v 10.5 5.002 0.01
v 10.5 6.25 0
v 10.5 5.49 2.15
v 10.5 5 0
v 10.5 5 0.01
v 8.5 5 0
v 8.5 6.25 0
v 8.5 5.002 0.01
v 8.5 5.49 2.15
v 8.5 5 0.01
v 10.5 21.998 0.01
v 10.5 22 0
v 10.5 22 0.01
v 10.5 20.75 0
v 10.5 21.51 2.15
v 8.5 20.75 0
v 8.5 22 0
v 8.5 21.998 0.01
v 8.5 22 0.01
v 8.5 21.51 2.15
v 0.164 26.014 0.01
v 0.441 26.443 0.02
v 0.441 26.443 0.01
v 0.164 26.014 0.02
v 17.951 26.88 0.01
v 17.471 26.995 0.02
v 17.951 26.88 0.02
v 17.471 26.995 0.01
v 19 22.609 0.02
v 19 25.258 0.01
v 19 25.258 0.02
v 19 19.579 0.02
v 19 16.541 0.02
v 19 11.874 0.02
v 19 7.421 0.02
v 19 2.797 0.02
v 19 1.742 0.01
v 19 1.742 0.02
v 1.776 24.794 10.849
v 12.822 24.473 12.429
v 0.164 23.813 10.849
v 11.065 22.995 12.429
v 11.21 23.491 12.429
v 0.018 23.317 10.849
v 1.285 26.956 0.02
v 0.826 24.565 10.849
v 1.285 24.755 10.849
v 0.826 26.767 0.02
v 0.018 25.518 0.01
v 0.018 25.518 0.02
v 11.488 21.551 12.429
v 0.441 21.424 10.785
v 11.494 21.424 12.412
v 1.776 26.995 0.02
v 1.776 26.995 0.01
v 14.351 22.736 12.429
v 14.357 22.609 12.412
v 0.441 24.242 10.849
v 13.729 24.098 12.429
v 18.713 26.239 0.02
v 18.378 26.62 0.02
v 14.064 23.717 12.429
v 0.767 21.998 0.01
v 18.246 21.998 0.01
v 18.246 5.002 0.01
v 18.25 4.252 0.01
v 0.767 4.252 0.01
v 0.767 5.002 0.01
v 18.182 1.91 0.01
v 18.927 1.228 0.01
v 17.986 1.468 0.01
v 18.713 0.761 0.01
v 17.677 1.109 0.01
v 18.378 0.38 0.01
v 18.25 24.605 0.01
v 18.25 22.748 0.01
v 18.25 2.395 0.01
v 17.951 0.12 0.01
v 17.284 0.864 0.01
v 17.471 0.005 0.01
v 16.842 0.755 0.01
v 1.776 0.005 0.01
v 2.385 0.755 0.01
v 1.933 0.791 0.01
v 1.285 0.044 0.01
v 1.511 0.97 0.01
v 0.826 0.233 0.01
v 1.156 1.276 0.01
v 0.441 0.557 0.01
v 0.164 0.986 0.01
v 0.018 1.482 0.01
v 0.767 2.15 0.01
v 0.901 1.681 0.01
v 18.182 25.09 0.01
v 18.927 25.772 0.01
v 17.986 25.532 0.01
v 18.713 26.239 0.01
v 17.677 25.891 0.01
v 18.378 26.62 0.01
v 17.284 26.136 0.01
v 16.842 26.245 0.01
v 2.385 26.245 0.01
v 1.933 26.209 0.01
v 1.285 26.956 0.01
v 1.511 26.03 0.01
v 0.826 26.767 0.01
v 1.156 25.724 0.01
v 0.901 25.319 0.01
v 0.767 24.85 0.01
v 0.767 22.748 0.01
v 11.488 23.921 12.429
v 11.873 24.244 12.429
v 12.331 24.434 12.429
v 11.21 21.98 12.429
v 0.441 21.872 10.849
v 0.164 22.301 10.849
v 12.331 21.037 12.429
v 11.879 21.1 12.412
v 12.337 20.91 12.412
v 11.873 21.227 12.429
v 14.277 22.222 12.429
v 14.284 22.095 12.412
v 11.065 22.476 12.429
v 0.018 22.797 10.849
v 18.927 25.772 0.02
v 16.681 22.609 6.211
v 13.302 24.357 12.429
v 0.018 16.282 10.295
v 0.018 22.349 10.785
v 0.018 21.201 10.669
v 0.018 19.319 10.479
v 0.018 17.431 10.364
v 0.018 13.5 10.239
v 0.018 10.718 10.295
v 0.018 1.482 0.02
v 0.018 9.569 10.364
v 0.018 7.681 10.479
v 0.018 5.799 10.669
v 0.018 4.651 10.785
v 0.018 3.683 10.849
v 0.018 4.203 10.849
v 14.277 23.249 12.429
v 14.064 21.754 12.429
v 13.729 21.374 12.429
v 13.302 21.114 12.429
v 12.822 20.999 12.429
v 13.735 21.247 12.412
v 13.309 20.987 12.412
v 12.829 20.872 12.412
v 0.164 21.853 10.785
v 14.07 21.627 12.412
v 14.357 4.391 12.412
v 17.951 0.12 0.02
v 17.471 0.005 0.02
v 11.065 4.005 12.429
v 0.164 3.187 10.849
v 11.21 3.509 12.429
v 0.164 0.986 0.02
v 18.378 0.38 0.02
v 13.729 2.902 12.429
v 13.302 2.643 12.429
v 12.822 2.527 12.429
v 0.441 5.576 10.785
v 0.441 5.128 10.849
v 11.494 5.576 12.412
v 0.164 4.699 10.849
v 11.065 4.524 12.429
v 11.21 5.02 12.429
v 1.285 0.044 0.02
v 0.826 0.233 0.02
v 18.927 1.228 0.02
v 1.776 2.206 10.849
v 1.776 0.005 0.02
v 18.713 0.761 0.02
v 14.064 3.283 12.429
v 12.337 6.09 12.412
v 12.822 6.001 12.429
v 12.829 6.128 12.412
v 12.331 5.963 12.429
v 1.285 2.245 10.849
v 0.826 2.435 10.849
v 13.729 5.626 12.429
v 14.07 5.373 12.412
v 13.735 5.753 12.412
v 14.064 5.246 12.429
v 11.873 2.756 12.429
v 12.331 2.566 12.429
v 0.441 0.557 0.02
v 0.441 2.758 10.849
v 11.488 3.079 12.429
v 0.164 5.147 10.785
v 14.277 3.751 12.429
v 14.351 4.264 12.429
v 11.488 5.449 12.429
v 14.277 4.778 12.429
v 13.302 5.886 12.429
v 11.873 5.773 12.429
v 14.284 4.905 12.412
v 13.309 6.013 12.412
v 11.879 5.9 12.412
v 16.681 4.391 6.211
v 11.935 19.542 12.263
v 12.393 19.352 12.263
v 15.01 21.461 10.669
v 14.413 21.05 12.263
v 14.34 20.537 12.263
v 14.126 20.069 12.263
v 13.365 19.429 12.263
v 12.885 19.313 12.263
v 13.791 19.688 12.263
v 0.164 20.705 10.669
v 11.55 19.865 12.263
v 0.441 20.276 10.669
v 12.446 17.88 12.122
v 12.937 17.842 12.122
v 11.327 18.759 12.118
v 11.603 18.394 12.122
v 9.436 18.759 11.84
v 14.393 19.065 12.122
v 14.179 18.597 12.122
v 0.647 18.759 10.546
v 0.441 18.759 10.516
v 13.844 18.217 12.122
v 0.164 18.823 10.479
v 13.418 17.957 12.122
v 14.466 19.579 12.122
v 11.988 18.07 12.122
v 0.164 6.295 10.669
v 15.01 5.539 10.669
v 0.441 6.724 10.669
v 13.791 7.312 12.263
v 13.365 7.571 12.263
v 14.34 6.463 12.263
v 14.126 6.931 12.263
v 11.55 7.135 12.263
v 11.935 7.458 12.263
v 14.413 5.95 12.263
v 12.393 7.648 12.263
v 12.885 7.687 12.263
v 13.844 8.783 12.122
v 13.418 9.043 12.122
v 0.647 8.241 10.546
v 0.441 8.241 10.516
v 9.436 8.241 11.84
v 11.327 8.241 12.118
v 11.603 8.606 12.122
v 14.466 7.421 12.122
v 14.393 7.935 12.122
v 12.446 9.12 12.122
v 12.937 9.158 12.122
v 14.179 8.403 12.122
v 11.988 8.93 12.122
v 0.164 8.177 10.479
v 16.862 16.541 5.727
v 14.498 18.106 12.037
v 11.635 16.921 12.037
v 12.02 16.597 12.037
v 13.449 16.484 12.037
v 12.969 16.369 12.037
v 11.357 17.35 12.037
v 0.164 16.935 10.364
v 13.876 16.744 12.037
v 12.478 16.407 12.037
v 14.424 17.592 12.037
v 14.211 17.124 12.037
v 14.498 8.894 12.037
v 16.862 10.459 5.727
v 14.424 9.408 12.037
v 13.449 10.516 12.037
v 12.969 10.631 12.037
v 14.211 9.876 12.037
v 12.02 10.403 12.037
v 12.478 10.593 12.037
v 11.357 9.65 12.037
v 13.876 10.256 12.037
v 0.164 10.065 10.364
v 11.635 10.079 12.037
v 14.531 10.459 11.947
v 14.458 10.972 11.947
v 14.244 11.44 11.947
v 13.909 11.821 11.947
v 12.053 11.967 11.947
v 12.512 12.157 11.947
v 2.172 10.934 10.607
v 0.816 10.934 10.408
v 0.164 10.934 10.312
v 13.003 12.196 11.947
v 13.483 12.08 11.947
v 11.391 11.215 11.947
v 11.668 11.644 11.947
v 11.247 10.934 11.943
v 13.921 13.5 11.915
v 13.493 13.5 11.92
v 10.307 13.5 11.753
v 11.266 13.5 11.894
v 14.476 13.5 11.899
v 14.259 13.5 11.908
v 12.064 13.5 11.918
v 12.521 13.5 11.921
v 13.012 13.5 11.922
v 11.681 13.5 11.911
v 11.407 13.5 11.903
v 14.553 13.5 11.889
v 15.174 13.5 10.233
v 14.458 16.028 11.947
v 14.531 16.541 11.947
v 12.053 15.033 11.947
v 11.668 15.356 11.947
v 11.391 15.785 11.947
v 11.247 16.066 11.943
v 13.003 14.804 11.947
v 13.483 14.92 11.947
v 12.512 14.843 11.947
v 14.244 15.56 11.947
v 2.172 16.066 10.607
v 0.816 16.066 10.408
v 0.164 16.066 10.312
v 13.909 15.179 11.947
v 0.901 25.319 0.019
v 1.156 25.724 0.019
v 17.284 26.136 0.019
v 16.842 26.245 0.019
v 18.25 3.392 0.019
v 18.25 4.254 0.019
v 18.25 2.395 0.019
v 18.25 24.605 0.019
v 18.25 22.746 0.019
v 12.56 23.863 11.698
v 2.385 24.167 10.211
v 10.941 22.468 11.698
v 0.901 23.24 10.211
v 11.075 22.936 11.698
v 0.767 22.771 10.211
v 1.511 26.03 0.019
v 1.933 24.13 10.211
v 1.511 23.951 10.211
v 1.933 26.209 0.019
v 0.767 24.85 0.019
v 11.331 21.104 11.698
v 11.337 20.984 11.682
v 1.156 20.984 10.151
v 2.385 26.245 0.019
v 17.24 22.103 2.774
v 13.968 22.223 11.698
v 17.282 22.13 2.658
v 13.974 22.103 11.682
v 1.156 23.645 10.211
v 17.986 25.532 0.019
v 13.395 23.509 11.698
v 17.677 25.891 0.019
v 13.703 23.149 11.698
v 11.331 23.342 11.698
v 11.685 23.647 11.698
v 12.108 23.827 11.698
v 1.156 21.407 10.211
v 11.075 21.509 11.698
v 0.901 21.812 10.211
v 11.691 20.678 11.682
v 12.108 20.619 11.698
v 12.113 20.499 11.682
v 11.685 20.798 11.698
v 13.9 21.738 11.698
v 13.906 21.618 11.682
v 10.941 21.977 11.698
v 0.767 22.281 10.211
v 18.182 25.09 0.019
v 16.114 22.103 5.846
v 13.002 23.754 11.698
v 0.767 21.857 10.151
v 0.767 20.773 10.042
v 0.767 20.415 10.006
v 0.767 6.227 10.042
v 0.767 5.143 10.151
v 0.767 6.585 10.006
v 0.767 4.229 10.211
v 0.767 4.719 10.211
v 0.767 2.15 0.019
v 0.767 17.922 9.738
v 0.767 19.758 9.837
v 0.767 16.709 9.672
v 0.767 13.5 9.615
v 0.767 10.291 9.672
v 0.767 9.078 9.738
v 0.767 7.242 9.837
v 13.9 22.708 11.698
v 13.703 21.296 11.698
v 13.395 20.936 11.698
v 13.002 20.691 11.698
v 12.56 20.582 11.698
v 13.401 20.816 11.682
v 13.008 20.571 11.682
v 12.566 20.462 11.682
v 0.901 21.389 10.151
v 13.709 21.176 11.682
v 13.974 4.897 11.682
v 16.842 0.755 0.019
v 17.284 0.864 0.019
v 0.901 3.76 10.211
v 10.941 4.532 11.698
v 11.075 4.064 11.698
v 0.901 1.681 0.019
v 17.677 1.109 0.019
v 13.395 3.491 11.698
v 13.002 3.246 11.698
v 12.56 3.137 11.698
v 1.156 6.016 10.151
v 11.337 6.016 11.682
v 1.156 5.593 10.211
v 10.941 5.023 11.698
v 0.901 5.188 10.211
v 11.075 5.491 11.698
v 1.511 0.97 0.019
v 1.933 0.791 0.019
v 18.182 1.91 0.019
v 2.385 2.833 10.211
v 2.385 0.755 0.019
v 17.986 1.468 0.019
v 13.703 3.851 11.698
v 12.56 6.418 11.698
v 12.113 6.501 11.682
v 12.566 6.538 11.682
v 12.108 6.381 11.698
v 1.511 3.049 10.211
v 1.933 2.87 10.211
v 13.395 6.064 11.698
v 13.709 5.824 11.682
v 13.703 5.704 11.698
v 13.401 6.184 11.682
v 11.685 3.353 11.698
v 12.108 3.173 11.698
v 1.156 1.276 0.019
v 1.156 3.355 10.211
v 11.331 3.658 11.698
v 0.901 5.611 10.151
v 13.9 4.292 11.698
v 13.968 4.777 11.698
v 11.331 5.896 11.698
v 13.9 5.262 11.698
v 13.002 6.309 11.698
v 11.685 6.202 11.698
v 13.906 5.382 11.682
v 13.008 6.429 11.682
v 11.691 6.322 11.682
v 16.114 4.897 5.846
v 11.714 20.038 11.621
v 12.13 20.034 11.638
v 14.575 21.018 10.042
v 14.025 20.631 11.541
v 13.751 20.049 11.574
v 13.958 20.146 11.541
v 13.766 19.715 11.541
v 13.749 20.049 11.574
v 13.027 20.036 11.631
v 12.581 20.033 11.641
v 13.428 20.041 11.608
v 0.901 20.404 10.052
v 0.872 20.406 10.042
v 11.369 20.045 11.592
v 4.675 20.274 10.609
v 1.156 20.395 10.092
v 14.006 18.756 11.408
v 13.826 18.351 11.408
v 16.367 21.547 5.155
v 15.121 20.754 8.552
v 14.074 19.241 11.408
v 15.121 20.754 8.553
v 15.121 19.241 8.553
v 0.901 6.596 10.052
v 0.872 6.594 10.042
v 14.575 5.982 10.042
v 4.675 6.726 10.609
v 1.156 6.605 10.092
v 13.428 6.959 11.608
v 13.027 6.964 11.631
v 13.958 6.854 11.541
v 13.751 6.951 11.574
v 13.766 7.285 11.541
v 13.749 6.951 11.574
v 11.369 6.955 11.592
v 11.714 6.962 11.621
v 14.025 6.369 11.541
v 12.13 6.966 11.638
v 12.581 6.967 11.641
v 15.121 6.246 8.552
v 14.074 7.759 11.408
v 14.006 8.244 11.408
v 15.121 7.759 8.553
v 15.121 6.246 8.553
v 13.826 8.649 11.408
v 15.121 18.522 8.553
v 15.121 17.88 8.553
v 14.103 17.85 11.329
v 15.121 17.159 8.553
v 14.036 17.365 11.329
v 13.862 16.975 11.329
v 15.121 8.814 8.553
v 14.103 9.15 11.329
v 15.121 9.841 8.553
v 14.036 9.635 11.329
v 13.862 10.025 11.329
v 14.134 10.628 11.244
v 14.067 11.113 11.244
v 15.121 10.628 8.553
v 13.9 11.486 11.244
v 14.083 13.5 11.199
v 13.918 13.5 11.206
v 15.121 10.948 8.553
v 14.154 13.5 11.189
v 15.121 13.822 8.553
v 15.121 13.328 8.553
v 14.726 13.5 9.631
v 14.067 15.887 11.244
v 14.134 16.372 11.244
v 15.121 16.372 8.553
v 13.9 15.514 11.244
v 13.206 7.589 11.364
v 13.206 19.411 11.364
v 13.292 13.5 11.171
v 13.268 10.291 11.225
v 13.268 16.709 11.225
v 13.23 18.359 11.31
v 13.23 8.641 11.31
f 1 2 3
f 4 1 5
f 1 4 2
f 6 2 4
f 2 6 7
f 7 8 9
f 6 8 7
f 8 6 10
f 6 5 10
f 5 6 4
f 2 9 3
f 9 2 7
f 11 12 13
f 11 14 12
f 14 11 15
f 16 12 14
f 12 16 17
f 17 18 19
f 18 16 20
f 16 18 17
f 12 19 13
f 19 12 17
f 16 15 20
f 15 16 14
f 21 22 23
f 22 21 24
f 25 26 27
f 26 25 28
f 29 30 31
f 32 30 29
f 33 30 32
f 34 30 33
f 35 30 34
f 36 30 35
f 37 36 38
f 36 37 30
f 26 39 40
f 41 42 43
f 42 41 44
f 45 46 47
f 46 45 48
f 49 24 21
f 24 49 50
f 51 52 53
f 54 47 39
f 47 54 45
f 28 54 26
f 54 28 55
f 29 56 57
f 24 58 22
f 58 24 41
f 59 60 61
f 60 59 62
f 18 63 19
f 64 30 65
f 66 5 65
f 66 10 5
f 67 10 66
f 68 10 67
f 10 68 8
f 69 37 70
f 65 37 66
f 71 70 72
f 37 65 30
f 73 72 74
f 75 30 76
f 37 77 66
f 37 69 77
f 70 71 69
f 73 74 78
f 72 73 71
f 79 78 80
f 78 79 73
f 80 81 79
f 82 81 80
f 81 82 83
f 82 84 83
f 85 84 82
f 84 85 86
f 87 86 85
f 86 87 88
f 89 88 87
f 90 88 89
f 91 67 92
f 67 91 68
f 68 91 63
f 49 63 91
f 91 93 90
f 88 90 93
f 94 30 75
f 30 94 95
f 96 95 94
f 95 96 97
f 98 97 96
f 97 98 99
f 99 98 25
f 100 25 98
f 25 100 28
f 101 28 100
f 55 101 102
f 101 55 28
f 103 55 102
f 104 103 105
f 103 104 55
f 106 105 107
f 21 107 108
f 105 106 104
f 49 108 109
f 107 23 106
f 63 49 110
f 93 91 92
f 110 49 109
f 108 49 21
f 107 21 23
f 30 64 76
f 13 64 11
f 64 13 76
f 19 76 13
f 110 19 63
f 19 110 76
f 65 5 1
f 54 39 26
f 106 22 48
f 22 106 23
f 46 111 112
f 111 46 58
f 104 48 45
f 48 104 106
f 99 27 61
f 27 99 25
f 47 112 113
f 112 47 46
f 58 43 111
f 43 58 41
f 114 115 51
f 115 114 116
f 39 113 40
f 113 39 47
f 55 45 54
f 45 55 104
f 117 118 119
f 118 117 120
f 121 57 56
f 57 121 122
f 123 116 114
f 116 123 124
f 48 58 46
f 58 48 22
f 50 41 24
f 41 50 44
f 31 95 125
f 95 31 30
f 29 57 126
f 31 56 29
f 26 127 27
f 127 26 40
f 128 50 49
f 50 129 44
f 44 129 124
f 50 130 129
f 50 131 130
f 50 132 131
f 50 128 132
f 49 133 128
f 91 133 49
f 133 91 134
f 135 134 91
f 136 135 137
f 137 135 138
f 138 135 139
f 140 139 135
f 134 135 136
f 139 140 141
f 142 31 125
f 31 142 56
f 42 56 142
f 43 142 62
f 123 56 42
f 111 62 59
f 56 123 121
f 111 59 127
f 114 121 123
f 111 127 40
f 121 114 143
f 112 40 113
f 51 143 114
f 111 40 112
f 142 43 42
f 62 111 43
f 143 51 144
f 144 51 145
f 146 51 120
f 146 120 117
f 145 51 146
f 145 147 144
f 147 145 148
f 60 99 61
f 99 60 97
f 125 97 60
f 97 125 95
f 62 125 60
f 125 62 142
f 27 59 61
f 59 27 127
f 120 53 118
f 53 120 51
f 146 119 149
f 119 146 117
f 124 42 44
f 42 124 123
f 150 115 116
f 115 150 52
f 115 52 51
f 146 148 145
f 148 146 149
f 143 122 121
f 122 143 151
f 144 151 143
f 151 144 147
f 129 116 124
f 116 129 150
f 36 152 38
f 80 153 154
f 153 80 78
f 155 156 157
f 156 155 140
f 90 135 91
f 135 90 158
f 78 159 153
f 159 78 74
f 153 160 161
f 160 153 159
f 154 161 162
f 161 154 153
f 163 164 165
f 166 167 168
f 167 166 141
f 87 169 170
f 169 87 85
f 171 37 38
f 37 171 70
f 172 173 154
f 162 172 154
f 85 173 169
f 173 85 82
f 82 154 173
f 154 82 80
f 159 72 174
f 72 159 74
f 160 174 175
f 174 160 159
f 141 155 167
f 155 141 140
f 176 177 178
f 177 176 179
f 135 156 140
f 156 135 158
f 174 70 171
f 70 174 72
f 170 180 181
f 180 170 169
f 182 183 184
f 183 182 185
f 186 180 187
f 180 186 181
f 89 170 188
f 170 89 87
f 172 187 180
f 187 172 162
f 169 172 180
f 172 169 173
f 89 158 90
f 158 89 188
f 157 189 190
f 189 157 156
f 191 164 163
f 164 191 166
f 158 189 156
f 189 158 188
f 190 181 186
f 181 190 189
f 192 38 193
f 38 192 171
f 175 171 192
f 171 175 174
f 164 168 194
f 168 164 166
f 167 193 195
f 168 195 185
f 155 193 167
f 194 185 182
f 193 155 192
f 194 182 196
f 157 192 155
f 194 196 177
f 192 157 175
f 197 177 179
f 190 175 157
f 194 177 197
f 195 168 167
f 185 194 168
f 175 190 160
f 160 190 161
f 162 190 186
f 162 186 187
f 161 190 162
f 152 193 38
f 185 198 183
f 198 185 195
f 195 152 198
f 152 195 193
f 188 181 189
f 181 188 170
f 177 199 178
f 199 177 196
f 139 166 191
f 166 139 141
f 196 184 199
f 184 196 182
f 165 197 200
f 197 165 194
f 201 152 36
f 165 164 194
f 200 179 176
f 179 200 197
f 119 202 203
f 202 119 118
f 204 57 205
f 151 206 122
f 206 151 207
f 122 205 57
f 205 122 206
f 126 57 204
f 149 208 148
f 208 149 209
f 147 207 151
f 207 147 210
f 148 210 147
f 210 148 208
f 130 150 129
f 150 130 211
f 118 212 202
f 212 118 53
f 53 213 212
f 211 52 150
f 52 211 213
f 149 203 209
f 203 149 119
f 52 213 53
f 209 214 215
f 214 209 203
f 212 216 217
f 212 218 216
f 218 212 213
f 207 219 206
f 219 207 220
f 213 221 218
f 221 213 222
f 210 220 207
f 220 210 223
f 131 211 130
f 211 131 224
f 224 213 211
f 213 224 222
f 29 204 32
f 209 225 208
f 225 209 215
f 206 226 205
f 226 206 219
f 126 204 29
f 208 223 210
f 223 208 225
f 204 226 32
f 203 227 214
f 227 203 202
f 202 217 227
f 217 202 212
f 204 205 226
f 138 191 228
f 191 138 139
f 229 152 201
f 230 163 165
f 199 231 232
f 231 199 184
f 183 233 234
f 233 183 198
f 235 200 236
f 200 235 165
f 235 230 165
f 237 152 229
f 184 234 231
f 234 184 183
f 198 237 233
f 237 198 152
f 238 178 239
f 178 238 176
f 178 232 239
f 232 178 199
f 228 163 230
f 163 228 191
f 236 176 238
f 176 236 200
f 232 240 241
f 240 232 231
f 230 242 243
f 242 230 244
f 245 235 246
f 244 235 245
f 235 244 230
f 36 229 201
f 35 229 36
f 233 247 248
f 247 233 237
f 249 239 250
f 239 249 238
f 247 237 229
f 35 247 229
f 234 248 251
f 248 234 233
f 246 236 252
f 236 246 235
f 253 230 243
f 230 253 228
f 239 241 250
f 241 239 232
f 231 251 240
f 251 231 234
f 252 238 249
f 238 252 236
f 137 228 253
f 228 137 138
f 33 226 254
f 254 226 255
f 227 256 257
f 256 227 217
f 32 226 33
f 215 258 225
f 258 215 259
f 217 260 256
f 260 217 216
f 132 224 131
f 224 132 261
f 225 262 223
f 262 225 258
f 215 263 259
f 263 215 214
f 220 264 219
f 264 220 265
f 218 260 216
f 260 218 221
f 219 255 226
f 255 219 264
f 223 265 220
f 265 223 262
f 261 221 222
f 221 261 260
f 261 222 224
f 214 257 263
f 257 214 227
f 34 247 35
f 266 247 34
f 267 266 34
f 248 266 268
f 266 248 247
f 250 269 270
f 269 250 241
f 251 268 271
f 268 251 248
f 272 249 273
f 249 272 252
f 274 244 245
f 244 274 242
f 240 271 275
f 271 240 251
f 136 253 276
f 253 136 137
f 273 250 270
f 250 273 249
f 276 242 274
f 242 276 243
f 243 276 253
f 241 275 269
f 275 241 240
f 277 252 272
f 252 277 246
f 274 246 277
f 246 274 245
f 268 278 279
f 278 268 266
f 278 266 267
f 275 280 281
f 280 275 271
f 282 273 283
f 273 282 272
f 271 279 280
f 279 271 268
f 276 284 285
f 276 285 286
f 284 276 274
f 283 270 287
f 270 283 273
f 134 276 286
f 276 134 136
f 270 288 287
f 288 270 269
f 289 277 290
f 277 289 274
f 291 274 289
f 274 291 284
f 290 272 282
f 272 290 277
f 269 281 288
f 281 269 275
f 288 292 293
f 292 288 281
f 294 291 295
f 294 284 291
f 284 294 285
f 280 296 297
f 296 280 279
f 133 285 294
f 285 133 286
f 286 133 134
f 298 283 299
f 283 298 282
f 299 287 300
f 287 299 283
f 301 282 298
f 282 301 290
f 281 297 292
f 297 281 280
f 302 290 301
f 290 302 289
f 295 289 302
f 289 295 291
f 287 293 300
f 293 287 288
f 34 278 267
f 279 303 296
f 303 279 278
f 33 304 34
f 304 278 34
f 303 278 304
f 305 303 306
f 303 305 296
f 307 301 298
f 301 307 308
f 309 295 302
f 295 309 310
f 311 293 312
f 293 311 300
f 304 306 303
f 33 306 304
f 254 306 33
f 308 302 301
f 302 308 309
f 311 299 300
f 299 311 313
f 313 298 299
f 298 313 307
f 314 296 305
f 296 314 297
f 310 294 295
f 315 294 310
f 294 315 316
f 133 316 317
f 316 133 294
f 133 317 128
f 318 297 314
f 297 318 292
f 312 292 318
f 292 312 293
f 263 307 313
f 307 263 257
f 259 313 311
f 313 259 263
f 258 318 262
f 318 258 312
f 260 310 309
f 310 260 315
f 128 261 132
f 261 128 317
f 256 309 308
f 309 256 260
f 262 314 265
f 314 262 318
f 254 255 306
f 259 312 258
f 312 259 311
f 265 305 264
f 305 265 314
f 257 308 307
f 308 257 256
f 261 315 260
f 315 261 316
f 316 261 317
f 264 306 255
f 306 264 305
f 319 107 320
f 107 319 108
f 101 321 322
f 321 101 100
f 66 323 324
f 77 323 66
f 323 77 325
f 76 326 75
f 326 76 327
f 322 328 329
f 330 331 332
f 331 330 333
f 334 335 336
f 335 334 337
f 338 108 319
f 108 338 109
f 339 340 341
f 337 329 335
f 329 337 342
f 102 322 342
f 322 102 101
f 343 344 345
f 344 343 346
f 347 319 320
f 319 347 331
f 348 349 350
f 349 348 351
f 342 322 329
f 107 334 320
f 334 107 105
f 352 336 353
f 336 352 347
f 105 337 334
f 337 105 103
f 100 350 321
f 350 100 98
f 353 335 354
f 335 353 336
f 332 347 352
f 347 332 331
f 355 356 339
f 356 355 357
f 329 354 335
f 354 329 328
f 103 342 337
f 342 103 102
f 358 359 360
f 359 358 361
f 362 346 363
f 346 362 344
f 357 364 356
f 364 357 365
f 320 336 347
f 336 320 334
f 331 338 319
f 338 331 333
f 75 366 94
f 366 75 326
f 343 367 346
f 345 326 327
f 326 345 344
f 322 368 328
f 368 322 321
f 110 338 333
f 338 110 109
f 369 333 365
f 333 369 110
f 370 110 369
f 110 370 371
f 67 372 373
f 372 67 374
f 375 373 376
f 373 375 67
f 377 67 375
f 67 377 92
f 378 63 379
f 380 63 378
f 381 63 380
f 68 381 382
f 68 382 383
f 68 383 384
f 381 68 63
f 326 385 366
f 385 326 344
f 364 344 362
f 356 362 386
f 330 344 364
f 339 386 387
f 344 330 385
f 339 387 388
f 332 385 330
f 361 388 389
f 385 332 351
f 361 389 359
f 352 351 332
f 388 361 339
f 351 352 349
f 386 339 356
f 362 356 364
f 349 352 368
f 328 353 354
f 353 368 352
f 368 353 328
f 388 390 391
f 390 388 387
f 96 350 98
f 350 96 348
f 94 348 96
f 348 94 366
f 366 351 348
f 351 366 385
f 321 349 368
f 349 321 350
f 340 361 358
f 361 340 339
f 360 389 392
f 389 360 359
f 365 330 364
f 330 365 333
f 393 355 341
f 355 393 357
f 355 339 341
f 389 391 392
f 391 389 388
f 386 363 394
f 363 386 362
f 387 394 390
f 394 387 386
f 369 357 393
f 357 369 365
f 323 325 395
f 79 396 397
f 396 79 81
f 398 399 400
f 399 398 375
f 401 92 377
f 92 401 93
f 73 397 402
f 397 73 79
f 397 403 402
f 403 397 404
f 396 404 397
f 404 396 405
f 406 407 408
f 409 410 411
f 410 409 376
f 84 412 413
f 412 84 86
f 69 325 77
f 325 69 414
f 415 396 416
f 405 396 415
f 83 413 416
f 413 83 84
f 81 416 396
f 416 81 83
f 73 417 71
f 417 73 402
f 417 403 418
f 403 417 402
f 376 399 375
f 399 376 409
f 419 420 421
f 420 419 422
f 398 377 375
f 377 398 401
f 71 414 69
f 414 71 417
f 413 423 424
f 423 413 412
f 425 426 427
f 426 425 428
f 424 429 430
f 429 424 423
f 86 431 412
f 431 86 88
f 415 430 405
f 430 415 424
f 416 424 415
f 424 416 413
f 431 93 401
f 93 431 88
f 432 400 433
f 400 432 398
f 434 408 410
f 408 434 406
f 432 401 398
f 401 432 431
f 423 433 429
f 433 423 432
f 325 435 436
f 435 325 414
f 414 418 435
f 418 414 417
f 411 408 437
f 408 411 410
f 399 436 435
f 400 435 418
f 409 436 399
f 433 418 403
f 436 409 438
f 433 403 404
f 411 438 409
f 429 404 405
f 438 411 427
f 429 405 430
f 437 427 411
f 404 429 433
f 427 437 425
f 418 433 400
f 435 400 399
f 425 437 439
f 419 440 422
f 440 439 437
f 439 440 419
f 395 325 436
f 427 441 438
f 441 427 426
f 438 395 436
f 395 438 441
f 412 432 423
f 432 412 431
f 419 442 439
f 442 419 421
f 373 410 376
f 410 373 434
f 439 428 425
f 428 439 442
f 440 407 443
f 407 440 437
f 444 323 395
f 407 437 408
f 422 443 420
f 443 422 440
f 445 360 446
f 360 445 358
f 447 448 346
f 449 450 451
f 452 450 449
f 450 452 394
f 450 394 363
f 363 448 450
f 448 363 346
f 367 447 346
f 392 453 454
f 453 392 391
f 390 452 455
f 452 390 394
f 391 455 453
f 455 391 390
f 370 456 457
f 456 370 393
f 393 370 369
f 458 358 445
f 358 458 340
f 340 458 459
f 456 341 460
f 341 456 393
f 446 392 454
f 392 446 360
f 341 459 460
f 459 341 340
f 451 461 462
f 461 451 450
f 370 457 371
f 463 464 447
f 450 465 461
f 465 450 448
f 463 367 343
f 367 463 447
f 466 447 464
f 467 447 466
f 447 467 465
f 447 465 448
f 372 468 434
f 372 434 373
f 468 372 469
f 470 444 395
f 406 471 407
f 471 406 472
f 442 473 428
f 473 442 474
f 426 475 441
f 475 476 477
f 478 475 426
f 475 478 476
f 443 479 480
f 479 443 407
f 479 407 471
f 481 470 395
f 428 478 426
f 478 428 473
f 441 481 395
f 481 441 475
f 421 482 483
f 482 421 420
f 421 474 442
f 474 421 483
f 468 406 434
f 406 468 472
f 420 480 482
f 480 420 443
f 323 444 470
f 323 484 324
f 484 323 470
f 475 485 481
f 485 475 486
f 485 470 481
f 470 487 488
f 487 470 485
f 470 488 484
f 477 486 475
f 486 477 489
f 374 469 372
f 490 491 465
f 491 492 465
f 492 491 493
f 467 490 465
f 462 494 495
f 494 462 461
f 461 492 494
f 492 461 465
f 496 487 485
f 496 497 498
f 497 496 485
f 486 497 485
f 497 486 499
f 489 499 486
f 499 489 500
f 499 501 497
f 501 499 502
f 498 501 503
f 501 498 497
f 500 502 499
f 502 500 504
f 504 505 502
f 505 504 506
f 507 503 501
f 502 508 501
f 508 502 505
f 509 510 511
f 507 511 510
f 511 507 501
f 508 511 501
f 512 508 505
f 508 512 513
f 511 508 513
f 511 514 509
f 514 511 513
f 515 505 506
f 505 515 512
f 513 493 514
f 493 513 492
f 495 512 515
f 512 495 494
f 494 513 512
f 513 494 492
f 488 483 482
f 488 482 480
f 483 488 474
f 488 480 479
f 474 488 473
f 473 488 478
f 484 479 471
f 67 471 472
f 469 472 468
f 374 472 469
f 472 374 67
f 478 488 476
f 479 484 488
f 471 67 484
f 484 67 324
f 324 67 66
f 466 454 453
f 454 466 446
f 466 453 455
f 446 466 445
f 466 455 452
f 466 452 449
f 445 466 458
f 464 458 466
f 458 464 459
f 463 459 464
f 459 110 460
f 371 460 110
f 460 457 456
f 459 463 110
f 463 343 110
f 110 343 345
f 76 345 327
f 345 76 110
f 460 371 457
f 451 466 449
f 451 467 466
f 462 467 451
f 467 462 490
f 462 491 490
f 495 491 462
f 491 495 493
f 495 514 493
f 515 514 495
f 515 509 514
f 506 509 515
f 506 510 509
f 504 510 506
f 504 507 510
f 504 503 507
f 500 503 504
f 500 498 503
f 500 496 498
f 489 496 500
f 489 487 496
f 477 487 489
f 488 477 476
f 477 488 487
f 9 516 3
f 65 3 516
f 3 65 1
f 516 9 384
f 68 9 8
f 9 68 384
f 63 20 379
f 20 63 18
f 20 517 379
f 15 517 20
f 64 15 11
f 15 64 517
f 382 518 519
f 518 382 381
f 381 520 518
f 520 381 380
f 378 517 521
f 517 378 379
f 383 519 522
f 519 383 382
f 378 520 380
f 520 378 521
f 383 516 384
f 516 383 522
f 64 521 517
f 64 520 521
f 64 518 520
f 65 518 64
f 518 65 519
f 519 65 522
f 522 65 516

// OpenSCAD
//measures are in millimeters
AY=27.0;
AX=19.0;
INNER_AY=18.5;
INNER_BY=12.5;
BY=22.0;
BLX=14.5;
EZ=11.0;
FLZ=14.0;
H=12.75;
CYL_OFF_Z=100;
CYL_DEPTH=0.05;
CLIP_X=2;
CLIP_Y=1.25;
CLIP_H=3*CLIP_Y;
CLIP_DISTANCE=17.0;
CORNER_RADIUS=2;

WallThickness=0.75;
ClipWidth=2.2;
ClipDepth=0.75;

//ascfront=FLZ/sqrt(pow(FLZ,2)-pow(H,2));
//asctop=(H-EZ)/sqrt(pow(BLX,2)-pow((H-EZ),2));

//curve control rod
//translate([14,4,0]) cube([1,1,H]);

alpha=asin((H-EZ)/BLX);
beta=asin(H/FLZ);
gamma=90-asin((0.5*(AY-BY))/EZ);

module keycap(){
	scale([AX/(AX+2*CORNER_RADIUS),AY/(AY+2*CORNER_RADIUS),1])
	translate([CORNER_RADIUS,CORNER_RADIUS,0.01])
	minkowski(){
		difference(){
			cube([AX,AY,H]);
			rotate(a=gamma,v=[1,0,0]) cube([100,100,100]);
			translate([0,AY,0]) rotate(a=90-gamma,v=[1,0,0]) cube([100,100,100]);
			translate([0,0,EZ]) rotate(a=-alpha,v=[0,1,0]) translate([-50,0,0]) cube([100,100,100]);
			translate([0,AY/2,EZ+CYL_OFF_Z]) rotate(a=90-alpha,v=[0,1,0]) cylinder(h=100,center=true,r=CYL_OFF_Z+CYL_DEPTH,$fa=2);
			translate([AX,0,0]) rotate(a=beta-90,v=[0,1,0]) cube([100,100,100]);
		}
		cylinder(h=0.01,r=CORNER_RADIUS,$fs=0.6);
		//rotate(a=90,v=[1,0,0]) cylinder(h=0.01,r=1,$fs=0.3);
	}
}

module struts(){
	difference(){
		cube([AX,INNER_AY,H]);
		rotate(a=gamma,v=[1,0,0]) cube([100,100,100]);
		translate([0,INNER_AY,0]) rotate(a=90-gamma,v=[1,0,0]) cube([100,100,100]);
		translate([0,0,EZ]) rotate(a=-alpha,v=[0,1,0]) translate([-50,0,0]) cube([100,100,100]);
		translate([0,INNER_AY/2,EZ+CYL_OFF_Z]) rotate(a=90-alpha,v=[0,1,0]) cylinder(h=100,center=true,r=CYL_OFF_Z+CYL_DEPTH,$fa=2);
		translate([AX,0,0]) rotate(a=beta-90,v=[0,1,0]) cube([100,100,100]);
	}
}

module clip(){
	difference(){
		cube([CLIP_X,CLIP_Y,CLIP_H]);
		translate([-1,CLIP_Y,0]) rotate(a=asin(CLIP_Y/CLIP_H),v=[1,0,0]) cube([100,100,100]);
        rotate(a=gamma, v=[1, 0, 0]) translate([-1, 0, WallThickness-0.1]) cube([100, 100, 100]);
	}
}

//clip distance control rod
//translate([(AX-CLIP_X)/2,(AY-CLIP_DISTANCE)/2,0]) cube([1,CLIP_DISTANCE,1]);
translate([(AX-CLIP_X)/2,(AY-CLIP_DISTANCE)/2,0]) clip();
translate([(AX-CLIP_X)/2,(AY+CLIP_DISTANCE)/2,0]) mirror([0,1,0]) clip();

difference(){
	keycap();
	difference(){
		translate([WallThickness, WallThickness, 0]) scale(v=[1-2*WallThickness/AX, 1-2*WallThickness/AY, 1-WallThickness/H]) keycap();
		translate([0,(AY-INNER_AY)/2,0]) difference(){
			struts();
			translate([WallThickness, WallThickness, 0]) scale(v=[1-2*WallThickness/AX, 1-2*WallThickness/INNER_AY, 1-WallThickness/H]) struts();
		}
		//translate([0,(AY-CLIP_DISTANCE)/2-WallThickness,0]) cube([100,WallThickness, 100]);
		//translate([0,(AY+CLIP_DISTANCE)/2,0]) cube([100,WallThickness, 100]);
	}
}
